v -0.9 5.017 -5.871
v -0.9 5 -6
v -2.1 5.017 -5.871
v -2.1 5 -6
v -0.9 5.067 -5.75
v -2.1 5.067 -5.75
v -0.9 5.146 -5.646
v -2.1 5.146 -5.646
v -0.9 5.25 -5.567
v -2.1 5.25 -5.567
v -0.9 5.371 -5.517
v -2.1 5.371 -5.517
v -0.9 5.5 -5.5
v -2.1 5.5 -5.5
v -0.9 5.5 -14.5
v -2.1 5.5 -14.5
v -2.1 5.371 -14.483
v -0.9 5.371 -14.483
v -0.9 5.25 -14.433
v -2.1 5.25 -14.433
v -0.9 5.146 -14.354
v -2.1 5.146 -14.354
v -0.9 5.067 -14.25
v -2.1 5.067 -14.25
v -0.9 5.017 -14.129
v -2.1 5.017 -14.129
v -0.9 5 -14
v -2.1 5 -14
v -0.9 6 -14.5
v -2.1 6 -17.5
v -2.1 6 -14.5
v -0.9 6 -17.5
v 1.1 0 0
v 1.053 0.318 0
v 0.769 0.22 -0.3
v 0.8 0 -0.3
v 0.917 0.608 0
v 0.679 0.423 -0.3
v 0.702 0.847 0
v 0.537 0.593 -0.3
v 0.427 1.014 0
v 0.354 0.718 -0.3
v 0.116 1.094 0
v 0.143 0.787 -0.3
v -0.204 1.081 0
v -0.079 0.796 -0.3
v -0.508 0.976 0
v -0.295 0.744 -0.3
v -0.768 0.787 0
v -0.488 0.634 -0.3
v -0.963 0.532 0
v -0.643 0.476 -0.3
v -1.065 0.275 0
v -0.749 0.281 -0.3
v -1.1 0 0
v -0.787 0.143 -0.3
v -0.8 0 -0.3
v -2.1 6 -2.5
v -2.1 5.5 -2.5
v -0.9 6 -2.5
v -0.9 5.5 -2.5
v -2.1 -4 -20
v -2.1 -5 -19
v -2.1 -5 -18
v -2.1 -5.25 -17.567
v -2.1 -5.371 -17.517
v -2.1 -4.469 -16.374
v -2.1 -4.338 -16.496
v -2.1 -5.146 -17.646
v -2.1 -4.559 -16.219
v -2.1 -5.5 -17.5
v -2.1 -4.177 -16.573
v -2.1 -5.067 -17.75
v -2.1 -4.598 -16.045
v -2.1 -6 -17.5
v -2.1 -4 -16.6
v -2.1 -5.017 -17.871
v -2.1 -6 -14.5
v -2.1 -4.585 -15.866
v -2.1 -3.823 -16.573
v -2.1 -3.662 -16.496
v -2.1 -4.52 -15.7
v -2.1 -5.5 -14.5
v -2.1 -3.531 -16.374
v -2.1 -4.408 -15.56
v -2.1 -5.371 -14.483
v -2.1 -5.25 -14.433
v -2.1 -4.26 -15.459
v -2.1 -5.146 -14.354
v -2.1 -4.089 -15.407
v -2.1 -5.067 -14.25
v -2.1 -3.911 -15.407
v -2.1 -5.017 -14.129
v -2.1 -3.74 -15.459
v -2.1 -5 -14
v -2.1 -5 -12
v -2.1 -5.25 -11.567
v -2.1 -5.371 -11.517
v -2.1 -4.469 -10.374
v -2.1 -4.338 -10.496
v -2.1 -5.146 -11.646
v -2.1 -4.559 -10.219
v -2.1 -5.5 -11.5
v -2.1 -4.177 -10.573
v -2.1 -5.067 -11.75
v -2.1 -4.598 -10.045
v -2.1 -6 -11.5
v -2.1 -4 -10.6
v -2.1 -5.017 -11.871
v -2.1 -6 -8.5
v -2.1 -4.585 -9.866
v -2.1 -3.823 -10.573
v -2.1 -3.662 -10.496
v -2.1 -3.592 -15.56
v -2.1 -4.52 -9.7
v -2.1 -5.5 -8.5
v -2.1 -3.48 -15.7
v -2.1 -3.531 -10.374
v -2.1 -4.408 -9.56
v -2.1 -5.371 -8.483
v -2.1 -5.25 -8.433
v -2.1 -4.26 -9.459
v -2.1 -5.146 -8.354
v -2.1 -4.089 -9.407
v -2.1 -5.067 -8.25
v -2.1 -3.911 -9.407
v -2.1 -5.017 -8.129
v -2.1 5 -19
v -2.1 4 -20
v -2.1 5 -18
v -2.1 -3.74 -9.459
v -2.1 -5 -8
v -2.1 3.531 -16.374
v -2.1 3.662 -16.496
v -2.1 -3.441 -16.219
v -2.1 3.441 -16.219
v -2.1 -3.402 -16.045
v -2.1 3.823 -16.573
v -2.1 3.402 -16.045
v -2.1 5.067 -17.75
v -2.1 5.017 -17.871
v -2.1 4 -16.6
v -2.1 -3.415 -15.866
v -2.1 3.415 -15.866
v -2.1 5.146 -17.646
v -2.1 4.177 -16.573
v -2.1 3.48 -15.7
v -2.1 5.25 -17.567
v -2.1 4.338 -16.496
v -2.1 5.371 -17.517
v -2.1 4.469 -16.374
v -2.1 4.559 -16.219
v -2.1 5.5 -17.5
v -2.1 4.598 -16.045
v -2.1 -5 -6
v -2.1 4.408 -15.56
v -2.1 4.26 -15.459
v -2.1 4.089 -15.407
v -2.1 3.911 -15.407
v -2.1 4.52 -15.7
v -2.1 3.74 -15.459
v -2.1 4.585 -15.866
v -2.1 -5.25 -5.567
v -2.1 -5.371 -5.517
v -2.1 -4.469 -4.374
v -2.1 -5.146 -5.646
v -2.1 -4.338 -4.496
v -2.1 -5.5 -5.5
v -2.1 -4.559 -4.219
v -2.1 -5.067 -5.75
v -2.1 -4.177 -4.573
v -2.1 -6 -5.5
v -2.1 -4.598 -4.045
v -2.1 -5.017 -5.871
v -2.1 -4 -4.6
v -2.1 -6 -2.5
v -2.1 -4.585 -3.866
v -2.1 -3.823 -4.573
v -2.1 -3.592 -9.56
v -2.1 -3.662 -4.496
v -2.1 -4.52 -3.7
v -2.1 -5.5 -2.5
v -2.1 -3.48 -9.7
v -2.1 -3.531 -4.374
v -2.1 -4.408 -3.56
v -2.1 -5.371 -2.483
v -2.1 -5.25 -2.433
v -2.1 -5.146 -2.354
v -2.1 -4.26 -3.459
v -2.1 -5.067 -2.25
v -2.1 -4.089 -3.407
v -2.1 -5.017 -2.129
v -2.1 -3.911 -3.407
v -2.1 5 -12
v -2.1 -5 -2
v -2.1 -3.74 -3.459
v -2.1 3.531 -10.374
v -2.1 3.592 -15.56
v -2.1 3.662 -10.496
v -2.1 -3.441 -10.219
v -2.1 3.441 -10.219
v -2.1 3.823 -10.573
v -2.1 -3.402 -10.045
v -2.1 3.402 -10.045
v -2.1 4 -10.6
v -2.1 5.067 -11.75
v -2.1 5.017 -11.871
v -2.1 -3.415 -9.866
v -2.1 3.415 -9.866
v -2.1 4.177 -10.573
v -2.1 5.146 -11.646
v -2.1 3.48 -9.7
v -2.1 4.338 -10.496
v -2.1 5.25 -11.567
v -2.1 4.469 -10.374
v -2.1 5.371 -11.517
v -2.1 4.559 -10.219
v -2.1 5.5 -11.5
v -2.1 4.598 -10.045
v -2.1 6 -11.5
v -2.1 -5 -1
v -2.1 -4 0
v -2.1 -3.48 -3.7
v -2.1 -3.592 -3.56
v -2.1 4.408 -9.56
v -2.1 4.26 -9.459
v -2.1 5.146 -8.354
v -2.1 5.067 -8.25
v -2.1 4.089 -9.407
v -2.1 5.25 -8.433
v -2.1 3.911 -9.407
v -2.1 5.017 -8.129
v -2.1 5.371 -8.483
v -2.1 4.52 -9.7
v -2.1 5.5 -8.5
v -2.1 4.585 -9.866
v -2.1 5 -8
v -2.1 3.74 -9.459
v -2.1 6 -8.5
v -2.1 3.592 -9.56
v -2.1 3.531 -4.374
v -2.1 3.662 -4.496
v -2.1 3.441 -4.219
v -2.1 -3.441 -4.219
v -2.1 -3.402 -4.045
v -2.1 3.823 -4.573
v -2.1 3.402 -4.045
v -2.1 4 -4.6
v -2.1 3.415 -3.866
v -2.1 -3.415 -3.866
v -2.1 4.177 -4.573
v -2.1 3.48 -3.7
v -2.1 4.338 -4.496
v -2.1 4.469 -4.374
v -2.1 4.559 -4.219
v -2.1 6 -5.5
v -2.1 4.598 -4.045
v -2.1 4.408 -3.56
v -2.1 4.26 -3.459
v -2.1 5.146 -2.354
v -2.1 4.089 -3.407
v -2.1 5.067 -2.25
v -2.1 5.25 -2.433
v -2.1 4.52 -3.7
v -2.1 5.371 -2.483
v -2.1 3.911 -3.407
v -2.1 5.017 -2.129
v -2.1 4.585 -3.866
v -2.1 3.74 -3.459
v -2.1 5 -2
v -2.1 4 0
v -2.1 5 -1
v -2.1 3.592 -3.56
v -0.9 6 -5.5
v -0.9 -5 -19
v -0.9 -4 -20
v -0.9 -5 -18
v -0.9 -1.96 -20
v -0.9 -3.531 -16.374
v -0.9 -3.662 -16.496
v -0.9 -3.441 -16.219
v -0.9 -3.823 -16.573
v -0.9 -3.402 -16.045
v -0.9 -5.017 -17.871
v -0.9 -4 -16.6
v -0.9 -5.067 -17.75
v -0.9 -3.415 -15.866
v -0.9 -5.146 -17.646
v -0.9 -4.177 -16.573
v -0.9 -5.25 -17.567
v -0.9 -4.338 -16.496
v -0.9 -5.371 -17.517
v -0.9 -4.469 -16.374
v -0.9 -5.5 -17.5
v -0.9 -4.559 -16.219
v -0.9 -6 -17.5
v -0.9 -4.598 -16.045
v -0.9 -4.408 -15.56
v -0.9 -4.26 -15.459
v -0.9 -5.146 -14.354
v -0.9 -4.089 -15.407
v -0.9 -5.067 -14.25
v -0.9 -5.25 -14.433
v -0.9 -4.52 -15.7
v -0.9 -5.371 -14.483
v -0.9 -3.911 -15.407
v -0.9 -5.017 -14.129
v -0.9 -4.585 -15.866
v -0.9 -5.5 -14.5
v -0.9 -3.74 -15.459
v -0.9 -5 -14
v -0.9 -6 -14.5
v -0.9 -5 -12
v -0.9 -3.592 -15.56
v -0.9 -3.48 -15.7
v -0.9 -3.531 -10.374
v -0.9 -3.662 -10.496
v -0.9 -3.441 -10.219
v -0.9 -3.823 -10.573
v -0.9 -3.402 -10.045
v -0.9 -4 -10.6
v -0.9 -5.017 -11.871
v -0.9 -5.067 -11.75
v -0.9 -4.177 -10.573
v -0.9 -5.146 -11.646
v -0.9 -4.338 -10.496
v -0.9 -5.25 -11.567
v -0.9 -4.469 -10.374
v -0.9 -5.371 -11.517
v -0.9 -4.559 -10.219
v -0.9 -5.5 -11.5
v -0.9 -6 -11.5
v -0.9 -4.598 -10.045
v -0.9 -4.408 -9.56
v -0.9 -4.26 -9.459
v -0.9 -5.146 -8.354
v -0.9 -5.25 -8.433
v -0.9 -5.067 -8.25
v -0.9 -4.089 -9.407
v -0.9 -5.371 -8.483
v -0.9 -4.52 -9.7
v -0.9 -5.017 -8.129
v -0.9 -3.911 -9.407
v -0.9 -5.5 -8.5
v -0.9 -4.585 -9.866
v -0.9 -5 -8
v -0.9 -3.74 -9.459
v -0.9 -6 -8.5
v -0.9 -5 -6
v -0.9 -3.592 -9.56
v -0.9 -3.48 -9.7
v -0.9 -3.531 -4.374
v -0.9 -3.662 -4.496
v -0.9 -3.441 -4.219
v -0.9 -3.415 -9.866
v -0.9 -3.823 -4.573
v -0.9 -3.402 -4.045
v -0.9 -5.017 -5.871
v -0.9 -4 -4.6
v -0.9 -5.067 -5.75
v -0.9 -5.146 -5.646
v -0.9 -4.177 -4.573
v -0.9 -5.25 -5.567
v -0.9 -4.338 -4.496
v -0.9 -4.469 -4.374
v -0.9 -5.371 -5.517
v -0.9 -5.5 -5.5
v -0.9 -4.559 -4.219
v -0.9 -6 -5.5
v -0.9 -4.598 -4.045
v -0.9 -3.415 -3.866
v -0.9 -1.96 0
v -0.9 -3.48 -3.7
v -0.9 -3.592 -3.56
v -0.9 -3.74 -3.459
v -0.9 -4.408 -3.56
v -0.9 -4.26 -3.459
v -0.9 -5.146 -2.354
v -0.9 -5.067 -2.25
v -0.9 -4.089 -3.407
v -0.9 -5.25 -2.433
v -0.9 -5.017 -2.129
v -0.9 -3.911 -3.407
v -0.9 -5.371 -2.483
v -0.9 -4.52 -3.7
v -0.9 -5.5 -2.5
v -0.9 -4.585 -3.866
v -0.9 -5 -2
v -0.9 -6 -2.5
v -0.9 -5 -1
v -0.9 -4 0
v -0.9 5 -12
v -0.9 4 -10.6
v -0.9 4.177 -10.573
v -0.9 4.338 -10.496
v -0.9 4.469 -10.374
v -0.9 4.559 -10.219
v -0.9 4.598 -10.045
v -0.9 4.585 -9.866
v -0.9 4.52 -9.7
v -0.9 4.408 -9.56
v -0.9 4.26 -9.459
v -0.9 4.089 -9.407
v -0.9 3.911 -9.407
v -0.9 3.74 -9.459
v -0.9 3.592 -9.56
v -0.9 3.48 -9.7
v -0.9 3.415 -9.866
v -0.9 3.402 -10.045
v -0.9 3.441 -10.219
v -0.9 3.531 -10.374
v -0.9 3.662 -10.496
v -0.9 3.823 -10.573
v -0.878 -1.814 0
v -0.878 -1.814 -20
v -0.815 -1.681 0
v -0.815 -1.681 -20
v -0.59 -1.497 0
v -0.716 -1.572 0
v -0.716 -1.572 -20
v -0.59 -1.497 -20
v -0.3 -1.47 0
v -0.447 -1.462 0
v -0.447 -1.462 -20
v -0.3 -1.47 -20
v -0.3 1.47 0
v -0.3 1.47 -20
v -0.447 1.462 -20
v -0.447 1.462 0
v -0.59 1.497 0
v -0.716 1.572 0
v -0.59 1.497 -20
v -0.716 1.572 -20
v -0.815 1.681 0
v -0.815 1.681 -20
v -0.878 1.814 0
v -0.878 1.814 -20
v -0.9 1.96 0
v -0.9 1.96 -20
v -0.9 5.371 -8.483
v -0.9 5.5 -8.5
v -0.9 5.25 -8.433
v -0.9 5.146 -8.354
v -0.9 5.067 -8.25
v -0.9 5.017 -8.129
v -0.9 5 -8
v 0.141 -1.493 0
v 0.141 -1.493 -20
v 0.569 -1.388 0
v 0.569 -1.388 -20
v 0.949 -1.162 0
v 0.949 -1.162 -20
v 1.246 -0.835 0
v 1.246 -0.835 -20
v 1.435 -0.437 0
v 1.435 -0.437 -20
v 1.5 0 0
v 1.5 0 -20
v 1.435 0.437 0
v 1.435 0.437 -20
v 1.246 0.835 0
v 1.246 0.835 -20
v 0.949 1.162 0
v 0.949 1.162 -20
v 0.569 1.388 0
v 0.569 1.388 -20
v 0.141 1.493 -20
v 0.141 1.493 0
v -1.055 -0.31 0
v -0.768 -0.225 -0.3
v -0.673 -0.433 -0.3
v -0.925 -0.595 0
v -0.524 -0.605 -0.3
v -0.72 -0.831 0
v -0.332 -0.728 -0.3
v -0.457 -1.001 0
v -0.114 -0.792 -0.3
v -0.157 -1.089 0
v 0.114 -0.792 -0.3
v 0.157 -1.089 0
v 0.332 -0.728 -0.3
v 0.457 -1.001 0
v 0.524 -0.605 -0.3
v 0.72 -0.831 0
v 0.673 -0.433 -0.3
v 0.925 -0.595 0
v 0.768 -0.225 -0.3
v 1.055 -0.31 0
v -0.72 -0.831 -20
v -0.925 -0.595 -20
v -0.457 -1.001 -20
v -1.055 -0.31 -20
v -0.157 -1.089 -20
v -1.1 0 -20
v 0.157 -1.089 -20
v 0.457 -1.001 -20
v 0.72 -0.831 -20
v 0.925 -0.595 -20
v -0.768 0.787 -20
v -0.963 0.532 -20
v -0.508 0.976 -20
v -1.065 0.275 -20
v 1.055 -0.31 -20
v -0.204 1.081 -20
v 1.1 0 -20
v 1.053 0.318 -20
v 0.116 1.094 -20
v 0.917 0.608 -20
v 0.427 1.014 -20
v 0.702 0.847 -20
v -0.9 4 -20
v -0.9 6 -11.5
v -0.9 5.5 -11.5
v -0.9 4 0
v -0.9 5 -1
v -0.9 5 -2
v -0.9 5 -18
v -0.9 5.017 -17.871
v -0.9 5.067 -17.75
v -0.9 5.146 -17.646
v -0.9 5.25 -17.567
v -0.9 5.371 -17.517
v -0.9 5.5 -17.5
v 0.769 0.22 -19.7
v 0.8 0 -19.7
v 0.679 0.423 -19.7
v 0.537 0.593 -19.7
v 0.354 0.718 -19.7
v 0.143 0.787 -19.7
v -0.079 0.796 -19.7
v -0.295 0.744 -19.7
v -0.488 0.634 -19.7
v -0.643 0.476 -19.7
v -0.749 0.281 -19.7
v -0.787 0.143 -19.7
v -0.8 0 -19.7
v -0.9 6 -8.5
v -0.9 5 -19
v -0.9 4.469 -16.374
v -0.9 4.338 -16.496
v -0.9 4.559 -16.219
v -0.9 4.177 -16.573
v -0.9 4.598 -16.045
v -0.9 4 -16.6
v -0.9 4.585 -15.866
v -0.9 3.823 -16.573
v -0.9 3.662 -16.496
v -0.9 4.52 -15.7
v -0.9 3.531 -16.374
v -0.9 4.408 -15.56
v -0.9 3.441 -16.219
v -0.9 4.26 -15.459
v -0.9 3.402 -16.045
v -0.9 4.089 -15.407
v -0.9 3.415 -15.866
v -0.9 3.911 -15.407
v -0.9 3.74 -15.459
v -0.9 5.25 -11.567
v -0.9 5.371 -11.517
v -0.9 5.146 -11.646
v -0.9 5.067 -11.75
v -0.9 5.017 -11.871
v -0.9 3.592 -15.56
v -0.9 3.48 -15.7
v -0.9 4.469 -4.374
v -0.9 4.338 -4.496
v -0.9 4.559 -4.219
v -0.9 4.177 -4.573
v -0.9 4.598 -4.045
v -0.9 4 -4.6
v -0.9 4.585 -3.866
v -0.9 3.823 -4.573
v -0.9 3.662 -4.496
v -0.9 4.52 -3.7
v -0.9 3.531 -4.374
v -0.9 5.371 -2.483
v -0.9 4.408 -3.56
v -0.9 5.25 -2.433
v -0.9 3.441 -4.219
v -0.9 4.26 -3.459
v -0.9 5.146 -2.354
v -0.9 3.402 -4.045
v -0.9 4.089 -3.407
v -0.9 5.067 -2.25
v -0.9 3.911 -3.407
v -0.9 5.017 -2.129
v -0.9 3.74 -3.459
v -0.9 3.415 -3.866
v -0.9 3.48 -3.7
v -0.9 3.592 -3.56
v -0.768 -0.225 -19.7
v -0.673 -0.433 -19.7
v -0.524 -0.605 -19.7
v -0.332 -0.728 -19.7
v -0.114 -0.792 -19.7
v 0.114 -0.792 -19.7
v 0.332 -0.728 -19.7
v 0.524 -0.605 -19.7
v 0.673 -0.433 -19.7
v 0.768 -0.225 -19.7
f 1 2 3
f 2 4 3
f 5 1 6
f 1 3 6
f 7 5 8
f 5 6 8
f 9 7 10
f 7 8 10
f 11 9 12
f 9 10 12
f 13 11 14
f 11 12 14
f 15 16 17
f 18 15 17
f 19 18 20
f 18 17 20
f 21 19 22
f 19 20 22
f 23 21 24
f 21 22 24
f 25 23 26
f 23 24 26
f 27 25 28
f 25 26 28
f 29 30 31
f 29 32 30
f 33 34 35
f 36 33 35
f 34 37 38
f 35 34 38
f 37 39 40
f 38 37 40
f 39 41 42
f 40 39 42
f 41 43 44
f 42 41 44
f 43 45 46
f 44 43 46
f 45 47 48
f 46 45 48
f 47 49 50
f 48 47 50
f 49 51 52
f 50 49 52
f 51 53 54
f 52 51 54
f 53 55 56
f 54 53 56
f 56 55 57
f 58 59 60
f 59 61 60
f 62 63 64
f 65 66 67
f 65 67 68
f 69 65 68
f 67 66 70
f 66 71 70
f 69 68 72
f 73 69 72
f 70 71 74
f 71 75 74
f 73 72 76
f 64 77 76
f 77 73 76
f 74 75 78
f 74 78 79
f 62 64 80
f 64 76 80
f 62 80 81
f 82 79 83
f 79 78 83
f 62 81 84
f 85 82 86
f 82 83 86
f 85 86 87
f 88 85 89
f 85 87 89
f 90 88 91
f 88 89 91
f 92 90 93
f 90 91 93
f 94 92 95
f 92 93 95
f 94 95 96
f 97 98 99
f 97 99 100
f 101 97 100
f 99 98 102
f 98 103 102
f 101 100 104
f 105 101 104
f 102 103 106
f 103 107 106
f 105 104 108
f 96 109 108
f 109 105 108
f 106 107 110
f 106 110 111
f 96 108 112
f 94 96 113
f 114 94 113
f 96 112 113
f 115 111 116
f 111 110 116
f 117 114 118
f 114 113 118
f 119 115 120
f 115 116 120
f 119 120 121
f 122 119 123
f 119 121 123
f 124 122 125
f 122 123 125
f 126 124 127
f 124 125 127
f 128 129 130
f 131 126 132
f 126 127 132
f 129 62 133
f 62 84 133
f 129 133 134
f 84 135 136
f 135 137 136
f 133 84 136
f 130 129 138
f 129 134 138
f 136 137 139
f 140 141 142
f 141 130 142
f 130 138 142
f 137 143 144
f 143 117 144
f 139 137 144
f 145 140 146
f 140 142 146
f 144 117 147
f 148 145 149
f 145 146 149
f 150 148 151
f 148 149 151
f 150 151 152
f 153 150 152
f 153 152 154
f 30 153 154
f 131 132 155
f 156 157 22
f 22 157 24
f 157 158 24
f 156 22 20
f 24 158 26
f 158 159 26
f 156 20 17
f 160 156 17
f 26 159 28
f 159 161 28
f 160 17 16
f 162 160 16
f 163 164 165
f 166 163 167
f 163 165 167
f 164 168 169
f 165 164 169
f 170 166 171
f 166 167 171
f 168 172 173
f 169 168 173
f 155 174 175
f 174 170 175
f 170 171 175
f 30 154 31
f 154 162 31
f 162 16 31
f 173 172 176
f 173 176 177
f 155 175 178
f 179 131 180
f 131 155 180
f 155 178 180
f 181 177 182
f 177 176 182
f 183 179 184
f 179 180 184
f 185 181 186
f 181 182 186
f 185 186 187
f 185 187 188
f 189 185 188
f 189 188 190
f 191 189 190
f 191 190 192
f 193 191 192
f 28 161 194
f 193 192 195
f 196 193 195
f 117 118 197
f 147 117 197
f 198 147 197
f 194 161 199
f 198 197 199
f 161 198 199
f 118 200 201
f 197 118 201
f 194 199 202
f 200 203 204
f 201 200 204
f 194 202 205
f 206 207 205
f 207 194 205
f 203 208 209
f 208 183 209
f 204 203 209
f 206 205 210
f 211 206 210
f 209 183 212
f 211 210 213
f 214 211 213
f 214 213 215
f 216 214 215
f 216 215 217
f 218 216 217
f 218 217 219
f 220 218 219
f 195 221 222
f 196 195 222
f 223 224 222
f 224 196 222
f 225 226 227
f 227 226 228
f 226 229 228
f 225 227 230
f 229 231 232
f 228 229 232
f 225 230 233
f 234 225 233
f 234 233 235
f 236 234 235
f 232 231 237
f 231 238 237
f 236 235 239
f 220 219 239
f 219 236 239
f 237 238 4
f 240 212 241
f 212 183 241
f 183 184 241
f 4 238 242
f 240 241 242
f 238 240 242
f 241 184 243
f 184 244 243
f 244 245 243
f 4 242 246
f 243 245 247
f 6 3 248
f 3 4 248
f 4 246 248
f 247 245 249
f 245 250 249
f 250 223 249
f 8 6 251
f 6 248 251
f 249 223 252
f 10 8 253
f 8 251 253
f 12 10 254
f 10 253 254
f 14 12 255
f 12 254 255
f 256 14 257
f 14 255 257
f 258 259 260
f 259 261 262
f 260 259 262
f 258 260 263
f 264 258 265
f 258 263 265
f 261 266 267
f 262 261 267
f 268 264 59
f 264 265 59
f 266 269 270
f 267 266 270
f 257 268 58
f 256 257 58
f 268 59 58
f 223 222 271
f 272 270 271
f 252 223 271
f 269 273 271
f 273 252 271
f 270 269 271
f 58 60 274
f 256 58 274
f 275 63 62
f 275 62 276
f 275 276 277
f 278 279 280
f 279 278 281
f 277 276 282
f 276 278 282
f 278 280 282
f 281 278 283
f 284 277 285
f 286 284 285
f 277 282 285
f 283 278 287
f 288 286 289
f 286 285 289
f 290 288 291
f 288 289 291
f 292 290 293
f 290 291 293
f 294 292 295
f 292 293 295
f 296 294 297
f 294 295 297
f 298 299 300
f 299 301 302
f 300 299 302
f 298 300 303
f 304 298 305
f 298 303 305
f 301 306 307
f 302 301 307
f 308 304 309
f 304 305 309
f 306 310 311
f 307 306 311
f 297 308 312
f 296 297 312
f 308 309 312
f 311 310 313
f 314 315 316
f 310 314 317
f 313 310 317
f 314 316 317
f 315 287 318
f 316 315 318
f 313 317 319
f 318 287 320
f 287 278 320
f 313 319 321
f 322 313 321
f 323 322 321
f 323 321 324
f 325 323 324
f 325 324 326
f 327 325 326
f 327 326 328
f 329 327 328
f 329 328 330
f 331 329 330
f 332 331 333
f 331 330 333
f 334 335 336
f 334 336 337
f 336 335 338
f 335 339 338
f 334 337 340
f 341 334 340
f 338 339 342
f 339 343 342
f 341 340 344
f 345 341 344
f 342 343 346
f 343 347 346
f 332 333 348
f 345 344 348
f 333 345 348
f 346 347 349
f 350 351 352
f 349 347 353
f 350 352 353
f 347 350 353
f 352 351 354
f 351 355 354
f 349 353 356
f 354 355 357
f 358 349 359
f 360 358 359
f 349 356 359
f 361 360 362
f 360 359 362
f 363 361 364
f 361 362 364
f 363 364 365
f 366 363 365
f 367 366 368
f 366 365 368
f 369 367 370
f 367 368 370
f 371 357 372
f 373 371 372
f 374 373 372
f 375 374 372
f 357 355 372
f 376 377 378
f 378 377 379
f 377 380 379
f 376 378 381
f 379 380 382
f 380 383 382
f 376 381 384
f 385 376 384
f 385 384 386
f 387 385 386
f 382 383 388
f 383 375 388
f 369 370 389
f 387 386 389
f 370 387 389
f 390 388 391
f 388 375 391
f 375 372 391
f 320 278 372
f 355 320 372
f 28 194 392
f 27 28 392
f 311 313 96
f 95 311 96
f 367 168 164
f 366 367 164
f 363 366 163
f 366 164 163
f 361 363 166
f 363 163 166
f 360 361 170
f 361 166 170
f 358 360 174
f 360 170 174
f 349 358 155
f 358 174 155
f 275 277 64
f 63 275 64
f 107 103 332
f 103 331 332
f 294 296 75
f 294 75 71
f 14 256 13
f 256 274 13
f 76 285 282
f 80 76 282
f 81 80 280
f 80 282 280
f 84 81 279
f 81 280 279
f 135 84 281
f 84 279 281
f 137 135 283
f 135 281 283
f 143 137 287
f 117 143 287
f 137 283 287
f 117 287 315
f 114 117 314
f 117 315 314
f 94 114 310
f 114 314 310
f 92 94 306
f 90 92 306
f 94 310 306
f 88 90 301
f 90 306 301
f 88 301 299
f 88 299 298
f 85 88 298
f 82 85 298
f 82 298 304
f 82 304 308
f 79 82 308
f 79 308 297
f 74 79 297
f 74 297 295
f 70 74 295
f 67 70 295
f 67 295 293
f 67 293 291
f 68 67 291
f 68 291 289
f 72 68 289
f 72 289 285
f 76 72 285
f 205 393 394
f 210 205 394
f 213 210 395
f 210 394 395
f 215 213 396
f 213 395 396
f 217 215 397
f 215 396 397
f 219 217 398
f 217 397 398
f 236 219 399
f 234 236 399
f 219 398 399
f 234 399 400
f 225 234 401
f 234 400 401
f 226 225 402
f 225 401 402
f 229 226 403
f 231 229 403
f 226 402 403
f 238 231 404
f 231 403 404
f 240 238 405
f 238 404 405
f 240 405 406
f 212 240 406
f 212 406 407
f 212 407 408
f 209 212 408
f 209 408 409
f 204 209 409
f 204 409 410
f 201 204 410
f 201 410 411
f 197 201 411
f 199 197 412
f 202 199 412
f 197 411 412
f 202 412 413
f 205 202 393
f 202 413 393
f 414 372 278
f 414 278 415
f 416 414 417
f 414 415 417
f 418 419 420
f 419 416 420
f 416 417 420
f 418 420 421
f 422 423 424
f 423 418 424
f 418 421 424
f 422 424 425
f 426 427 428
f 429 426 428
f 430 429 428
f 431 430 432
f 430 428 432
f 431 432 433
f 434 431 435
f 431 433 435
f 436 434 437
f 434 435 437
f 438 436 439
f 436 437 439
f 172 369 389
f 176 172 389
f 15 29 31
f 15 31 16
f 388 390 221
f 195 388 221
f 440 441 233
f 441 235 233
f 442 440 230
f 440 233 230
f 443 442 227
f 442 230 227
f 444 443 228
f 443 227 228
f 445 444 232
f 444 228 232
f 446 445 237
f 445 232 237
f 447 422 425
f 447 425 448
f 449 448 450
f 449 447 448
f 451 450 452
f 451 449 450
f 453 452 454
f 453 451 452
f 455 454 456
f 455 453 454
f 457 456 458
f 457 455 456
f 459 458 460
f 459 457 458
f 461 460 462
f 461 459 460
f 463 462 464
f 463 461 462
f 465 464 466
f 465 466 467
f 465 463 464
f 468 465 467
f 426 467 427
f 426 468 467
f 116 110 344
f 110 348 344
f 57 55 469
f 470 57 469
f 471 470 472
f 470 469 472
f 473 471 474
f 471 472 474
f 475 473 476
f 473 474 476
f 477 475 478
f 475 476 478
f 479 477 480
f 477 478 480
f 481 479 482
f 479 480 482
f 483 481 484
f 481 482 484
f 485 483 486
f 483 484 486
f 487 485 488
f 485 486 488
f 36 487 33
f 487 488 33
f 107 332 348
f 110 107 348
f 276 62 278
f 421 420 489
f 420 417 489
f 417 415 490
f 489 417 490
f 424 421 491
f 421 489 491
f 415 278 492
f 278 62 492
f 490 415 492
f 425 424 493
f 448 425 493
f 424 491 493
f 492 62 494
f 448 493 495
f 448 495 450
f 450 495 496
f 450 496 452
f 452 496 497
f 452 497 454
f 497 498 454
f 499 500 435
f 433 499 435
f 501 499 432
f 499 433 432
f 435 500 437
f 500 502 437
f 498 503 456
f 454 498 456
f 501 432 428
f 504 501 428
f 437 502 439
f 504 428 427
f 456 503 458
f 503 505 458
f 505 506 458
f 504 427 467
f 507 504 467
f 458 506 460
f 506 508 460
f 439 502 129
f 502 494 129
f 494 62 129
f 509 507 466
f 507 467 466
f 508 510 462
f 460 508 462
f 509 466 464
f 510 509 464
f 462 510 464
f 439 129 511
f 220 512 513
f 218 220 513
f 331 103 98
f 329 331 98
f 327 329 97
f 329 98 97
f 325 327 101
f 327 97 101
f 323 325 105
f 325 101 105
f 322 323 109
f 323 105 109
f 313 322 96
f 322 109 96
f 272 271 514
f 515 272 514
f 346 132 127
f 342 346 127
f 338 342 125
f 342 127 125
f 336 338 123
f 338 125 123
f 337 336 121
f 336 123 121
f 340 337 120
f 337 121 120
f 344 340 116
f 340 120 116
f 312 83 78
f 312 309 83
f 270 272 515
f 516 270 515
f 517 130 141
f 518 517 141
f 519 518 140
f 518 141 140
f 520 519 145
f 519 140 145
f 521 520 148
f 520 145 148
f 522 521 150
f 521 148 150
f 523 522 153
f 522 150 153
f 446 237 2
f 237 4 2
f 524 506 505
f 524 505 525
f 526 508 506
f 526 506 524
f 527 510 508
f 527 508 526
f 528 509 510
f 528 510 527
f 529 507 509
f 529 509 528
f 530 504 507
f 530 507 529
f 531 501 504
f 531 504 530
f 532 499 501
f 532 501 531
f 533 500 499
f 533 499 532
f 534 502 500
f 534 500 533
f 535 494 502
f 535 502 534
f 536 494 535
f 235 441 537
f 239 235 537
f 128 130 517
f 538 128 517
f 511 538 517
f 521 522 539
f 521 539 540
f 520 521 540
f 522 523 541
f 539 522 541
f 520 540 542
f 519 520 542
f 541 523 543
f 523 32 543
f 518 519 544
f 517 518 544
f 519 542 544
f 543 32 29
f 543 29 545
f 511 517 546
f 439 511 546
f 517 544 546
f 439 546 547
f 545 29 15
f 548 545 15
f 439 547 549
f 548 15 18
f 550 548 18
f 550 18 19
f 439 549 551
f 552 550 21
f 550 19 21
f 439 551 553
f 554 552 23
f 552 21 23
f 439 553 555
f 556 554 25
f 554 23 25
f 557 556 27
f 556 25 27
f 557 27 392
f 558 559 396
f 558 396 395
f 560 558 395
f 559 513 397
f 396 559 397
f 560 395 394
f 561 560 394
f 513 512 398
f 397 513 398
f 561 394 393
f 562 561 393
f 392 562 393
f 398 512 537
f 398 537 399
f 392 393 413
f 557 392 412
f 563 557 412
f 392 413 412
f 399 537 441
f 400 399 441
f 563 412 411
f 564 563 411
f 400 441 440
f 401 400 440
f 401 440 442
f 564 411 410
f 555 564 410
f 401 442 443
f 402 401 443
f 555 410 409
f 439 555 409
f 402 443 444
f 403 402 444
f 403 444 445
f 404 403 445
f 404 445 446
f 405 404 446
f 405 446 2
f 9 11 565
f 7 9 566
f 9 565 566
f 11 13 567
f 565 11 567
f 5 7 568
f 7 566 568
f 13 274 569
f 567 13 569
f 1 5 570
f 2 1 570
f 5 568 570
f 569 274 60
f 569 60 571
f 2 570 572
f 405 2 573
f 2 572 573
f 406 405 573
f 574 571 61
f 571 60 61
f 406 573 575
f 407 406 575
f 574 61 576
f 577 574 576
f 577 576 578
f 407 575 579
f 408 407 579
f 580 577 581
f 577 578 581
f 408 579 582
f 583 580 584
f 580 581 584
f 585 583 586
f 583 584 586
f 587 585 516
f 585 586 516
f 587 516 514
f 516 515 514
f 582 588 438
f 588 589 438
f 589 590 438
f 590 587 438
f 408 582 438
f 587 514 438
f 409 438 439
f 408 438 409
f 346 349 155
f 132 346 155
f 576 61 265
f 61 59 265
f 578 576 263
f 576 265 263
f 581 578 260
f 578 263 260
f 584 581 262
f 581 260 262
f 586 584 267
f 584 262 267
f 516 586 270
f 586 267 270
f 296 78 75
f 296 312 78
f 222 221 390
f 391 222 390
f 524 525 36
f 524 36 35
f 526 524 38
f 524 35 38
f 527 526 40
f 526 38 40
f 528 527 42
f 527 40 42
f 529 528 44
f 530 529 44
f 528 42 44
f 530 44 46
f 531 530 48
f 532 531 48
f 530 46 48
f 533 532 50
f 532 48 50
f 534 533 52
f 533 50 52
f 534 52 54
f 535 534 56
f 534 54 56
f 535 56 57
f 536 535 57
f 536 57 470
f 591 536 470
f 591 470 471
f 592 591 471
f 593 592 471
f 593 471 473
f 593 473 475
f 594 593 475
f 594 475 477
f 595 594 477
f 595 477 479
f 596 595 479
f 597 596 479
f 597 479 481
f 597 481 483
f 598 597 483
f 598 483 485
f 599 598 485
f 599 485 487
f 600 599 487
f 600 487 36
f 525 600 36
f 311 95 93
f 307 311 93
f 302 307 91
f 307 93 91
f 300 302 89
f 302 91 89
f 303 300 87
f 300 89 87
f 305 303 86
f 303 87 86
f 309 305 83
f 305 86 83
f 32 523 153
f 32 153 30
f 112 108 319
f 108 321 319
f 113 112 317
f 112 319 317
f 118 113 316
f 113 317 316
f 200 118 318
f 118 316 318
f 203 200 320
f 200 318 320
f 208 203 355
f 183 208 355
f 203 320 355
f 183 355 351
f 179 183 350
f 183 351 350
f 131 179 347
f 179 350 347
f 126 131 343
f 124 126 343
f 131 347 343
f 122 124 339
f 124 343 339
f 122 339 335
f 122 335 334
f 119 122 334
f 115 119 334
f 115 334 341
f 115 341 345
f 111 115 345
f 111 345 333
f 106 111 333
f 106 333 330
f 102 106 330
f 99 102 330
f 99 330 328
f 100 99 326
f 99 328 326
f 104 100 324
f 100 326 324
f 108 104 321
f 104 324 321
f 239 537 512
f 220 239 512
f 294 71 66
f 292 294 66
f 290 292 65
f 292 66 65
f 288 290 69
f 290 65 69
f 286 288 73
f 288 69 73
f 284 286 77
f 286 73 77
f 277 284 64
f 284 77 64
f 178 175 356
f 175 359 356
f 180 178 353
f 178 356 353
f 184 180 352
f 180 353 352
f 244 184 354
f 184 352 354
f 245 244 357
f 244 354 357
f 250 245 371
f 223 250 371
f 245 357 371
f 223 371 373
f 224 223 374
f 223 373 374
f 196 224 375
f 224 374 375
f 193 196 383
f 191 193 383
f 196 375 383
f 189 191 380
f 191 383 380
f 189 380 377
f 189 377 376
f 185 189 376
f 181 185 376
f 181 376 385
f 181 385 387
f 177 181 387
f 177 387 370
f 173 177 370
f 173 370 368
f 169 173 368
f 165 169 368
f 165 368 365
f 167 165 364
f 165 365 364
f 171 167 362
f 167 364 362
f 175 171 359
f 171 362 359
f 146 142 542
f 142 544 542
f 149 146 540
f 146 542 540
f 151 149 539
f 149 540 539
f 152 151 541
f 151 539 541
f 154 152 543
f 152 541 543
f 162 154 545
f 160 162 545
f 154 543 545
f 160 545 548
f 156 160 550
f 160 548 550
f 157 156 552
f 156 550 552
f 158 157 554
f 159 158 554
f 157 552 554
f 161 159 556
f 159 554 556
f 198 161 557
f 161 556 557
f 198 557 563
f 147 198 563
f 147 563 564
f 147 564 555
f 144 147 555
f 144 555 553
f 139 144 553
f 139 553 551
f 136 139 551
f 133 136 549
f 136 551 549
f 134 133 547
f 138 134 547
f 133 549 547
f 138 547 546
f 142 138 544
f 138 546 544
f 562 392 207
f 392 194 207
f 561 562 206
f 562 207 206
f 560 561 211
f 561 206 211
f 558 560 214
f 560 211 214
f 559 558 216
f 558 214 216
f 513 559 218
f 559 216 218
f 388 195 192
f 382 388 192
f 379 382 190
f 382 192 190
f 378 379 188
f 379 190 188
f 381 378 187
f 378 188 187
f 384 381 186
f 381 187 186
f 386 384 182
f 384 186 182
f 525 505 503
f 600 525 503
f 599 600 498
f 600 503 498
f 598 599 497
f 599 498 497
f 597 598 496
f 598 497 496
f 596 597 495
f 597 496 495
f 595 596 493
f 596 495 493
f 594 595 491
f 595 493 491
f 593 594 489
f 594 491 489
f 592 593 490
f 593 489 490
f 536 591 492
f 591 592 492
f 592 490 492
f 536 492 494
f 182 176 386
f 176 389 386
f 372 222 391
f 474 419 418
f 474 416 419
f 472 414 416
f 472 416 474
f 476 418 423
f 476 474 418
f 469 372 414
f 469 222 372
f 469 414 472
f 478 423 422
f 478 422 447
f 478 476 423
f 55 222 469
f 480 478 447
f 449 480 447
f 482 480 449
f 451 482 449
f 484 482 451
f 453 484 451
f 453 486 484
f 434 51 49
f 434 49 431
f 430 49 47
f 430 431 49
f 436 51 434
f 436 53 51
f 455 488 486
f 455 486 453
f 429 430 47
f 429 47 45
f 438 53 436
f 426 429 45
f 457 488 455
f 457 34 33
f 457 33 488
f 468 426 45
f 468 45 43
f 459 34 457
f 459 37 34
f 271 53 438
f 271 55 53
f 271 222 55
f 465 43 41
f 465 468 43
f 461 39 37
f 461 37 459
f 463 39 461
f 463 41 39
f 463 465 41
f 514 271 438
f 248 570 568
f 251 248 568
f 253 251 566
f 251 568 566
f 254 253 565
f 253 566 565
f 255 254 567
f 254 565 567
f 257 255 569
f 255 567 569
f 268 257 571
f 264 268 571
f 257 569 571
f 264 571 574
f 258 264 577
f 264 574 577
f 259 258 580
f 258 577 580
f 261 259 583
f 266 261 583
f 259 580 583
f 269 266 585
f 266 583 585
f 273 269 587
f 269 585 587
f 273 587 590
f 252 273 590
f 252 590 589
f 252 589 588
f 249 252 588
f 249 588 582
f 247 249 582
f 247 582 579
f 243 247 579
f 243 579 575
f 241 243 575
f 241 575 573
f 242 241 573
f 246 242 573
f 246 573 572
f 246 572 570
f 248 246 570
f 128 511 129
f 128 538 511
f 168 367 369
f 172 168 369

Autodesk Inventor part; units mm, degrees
ref_plane "YZ Plane" through (0, 0, 0) normal (1, 0, 0) x (0, 1, 0)
ref_plane "XZ Plane" through (0, 0, 0) normal (0, 1, 0) x (-1, 0, 0)
ref_plane "XY Plane" through (0, 0, 0) normal (0, 0, 1) x (1, 0, 0)
sketch "Sketch1" plane through (0, 0, 0) normal (0, 0, 1) x (1, 0, 0)
  circle A0 centre (0, 0) radius 0.8 projected
  circle A1 centre (0, 0) radius 0.4 projected
  circle A2 centre (0, 0) radius 0.8
  circle A3 centre (0, 0) radius 1.5
  line L0 (0, 0) -> (-1.5, 0)
  line L1 (-0.8, 0) -> (-1.5, 0)
  line L2 (-2.1, 5) -> (-0.9, 5)
  line L3 (-0.9, 5) -> (-0.9, -5)
  line L4 (-0.9, -5) -> (-2.1, -5)
  line L5 (-2.1, -5) -> (-2.1, 5)
  line L6 (-2.1, 5) -> (-0.9, -5) construction
  line L7 (-0.9, 5) -> (-2.1, -5) construction
  point P0 (-0.9, -1.2)
  point P1 (-0.9, 1.2)
  dimension "d0" = 1.6
  dimension "d1" = 3
  dimension "d2" = 1.2
  dimension "d3" = 10
extrude "Extrusion1" add sketch "Sketch1" against normal blind 20 contours L3 A3 | L3 A3 L0 | L0 A3 L3 | A3 L3 L4 L5 L2
fillet "Fillet1" radius 0.5 2 edges at (-0.9, -1.2, -10) (-0.9, 1.2, -10)
chamfer "Chamfer1" distance 0.3 angle 45 2 edges at (-0.8, 0, -20) (-0.8, 0, 0)
sketch "Sketch2" plane through (-0.9, 5, 0) normal (1, 0, 0) x (0, 0, -1)
  line L0 (20, -3.0404) -> (0, -3.0404) projected
  line L1 (20, 0) -> (20, -3.0404) projected
  line L2 (0, 0) -> (20, 0) projected
  line L3 (0, -3.0404) -> (0, 0) projected
  line L4 (20, 0) -> (20, -3.0404) projected
  line L5 (20, 0) -> (20, -1)
  line L6 (20, -1) -> (16, -1)
  line L7 (16, -1) -> (10, -1)
  line L8 (10, -1) -> (4, -1)
  line L9 (4, -1) -> (0, -1)
  line L10 (0, -3.0404) -> (0, 0) projected
  circle A0 centre (16, -1) radius 0.6
  circle A1 centre (10, -1) radius 0.6
  circle A2 centre (4, -1) radius 0.6
  point P0 (0, -5)
  dimension "d10" = 1
  dimension "d11" = 4
  dimension "d12" = 6
  dimension "d13" = 6
  dimension "d14" = 1.2
  dimension "d15" = 1.2
  dimension "d16" = 1.2
extrude "Extrusion2" cut sketch "Sketch2" against normal blind 20 contours A0 L7 L6 | L6 L7 A0 | A2 L8 L9 | L9 L8 A2 | A1 L8 L7 | L7 L8 A1
sketch "Sketch3" plane through (-0.9, 5, 0) normal (1, 0, 0) x (0, 0, -1)
  circle A0 centre (4, -1) radius 0.6 projected
  circle A1 centre (10, -1) radius 0.6 projected
  circle A2 centre (16, -1) radius 0.6 projected
  line L0 (20, -3.0404) -> (0, -3.0404) projected
  line L1 (20, 0) -> (20, -3.0404) projected
  line L2 (0, 0) -> (20, 0) projected
  line L3 (0, -3.0404) -> (0, 0) projected
  line L4 (17.5, -3) -> (17.5, 1)
  line L5 (17.5, 1) -> (14.5, 1)
  line L6 (14.5, 1) -> (14.5, -3)
  line L7 (14.5, -3) -> (17.5, -3)
  line L8 (17.5, -3) -> (14.5, 1) construction
  line L9 (17.5, 1) -> (14.5, -3) construction
  line L10 (11.5, 1) -> (11.5, -3)
  line L11 (11.5, -3) -> (8.5, -3)
  line L12 (8.5, -3) -> (8.5, 1)
  line L13 (8.5, 1) -> (11.5, 1)
  line L14 (11.5, 1) -> (8.5, -3) construction
  line L15 (11.5, -3) -> (8.5, 1) construction
  line L16 (5.5, 1) -> (5.5, -3)
  line L17 (5.5, -3) -> (2.5, -3)
  line L18 (2.5, -3) -> (2.5, 1)
  line L19 (2.5, 1) -> (5.5, 1)
  line L20 (5.5, 1) -> (2.5, -3) construction
  line L21 (5.5, -3) -> (2.5, 1) construction
  point P0 (0, -5)
  point P1 (2.5, 0)
  point P2 (5.5, 0)
  point P3 (8.5, 0)
  point P4 (11.5, 0)
  point P5 (14.5, 0)
  point P6 (17.5, 0)
  dimension "d19" = 4
  dimension "d20" = 3
  dimension "d21" = 4
  dimension "d22" = 3
  dimension "d23" = 4
  dimension "d24" = 3
extrude "Extrusion3" add sketch "Sketch3" against normal up to surface (1.2 mm away) contours L2 L6 L5 L4 | L18 L19 L16 L2 | L2 L12 L13 L10
ref_plane "Work Plane1" through (-2.1, 0, 0) normal (0, -1, 0) x (1, 0, 0)
mirror "Mirror1" about plane through (-2.1, 0, 0) normal (0, -1, 0) of "Extrusion2", "Extrusion3"
fillet "Fillet2" radius 0.5 12 edges at (-1.5, 5, -17.5) (-1.5, 5, -14.5) (-1.5, 5, -11.5) (-1.5, 5, -8.5) (-1.5, 5, -5.5) (-1.5, 5, -2.5) (-1.5, -5, -2.5) (-1.5, -5, -5.5) (-1.5, -5, -8.5) (-1.5, -5, -11.5) (-1.5, -5, -14.5) (-1.5, -5, -17.5)
chamfer "Chamfer2" distance 1 angle 45 4 edges at (-1.5, 5, -20) (-1.5, -5, -20) (-1.5, 5, 0) (-1.5, -5, 0)
properties part number "bl_tube_hn_1"
